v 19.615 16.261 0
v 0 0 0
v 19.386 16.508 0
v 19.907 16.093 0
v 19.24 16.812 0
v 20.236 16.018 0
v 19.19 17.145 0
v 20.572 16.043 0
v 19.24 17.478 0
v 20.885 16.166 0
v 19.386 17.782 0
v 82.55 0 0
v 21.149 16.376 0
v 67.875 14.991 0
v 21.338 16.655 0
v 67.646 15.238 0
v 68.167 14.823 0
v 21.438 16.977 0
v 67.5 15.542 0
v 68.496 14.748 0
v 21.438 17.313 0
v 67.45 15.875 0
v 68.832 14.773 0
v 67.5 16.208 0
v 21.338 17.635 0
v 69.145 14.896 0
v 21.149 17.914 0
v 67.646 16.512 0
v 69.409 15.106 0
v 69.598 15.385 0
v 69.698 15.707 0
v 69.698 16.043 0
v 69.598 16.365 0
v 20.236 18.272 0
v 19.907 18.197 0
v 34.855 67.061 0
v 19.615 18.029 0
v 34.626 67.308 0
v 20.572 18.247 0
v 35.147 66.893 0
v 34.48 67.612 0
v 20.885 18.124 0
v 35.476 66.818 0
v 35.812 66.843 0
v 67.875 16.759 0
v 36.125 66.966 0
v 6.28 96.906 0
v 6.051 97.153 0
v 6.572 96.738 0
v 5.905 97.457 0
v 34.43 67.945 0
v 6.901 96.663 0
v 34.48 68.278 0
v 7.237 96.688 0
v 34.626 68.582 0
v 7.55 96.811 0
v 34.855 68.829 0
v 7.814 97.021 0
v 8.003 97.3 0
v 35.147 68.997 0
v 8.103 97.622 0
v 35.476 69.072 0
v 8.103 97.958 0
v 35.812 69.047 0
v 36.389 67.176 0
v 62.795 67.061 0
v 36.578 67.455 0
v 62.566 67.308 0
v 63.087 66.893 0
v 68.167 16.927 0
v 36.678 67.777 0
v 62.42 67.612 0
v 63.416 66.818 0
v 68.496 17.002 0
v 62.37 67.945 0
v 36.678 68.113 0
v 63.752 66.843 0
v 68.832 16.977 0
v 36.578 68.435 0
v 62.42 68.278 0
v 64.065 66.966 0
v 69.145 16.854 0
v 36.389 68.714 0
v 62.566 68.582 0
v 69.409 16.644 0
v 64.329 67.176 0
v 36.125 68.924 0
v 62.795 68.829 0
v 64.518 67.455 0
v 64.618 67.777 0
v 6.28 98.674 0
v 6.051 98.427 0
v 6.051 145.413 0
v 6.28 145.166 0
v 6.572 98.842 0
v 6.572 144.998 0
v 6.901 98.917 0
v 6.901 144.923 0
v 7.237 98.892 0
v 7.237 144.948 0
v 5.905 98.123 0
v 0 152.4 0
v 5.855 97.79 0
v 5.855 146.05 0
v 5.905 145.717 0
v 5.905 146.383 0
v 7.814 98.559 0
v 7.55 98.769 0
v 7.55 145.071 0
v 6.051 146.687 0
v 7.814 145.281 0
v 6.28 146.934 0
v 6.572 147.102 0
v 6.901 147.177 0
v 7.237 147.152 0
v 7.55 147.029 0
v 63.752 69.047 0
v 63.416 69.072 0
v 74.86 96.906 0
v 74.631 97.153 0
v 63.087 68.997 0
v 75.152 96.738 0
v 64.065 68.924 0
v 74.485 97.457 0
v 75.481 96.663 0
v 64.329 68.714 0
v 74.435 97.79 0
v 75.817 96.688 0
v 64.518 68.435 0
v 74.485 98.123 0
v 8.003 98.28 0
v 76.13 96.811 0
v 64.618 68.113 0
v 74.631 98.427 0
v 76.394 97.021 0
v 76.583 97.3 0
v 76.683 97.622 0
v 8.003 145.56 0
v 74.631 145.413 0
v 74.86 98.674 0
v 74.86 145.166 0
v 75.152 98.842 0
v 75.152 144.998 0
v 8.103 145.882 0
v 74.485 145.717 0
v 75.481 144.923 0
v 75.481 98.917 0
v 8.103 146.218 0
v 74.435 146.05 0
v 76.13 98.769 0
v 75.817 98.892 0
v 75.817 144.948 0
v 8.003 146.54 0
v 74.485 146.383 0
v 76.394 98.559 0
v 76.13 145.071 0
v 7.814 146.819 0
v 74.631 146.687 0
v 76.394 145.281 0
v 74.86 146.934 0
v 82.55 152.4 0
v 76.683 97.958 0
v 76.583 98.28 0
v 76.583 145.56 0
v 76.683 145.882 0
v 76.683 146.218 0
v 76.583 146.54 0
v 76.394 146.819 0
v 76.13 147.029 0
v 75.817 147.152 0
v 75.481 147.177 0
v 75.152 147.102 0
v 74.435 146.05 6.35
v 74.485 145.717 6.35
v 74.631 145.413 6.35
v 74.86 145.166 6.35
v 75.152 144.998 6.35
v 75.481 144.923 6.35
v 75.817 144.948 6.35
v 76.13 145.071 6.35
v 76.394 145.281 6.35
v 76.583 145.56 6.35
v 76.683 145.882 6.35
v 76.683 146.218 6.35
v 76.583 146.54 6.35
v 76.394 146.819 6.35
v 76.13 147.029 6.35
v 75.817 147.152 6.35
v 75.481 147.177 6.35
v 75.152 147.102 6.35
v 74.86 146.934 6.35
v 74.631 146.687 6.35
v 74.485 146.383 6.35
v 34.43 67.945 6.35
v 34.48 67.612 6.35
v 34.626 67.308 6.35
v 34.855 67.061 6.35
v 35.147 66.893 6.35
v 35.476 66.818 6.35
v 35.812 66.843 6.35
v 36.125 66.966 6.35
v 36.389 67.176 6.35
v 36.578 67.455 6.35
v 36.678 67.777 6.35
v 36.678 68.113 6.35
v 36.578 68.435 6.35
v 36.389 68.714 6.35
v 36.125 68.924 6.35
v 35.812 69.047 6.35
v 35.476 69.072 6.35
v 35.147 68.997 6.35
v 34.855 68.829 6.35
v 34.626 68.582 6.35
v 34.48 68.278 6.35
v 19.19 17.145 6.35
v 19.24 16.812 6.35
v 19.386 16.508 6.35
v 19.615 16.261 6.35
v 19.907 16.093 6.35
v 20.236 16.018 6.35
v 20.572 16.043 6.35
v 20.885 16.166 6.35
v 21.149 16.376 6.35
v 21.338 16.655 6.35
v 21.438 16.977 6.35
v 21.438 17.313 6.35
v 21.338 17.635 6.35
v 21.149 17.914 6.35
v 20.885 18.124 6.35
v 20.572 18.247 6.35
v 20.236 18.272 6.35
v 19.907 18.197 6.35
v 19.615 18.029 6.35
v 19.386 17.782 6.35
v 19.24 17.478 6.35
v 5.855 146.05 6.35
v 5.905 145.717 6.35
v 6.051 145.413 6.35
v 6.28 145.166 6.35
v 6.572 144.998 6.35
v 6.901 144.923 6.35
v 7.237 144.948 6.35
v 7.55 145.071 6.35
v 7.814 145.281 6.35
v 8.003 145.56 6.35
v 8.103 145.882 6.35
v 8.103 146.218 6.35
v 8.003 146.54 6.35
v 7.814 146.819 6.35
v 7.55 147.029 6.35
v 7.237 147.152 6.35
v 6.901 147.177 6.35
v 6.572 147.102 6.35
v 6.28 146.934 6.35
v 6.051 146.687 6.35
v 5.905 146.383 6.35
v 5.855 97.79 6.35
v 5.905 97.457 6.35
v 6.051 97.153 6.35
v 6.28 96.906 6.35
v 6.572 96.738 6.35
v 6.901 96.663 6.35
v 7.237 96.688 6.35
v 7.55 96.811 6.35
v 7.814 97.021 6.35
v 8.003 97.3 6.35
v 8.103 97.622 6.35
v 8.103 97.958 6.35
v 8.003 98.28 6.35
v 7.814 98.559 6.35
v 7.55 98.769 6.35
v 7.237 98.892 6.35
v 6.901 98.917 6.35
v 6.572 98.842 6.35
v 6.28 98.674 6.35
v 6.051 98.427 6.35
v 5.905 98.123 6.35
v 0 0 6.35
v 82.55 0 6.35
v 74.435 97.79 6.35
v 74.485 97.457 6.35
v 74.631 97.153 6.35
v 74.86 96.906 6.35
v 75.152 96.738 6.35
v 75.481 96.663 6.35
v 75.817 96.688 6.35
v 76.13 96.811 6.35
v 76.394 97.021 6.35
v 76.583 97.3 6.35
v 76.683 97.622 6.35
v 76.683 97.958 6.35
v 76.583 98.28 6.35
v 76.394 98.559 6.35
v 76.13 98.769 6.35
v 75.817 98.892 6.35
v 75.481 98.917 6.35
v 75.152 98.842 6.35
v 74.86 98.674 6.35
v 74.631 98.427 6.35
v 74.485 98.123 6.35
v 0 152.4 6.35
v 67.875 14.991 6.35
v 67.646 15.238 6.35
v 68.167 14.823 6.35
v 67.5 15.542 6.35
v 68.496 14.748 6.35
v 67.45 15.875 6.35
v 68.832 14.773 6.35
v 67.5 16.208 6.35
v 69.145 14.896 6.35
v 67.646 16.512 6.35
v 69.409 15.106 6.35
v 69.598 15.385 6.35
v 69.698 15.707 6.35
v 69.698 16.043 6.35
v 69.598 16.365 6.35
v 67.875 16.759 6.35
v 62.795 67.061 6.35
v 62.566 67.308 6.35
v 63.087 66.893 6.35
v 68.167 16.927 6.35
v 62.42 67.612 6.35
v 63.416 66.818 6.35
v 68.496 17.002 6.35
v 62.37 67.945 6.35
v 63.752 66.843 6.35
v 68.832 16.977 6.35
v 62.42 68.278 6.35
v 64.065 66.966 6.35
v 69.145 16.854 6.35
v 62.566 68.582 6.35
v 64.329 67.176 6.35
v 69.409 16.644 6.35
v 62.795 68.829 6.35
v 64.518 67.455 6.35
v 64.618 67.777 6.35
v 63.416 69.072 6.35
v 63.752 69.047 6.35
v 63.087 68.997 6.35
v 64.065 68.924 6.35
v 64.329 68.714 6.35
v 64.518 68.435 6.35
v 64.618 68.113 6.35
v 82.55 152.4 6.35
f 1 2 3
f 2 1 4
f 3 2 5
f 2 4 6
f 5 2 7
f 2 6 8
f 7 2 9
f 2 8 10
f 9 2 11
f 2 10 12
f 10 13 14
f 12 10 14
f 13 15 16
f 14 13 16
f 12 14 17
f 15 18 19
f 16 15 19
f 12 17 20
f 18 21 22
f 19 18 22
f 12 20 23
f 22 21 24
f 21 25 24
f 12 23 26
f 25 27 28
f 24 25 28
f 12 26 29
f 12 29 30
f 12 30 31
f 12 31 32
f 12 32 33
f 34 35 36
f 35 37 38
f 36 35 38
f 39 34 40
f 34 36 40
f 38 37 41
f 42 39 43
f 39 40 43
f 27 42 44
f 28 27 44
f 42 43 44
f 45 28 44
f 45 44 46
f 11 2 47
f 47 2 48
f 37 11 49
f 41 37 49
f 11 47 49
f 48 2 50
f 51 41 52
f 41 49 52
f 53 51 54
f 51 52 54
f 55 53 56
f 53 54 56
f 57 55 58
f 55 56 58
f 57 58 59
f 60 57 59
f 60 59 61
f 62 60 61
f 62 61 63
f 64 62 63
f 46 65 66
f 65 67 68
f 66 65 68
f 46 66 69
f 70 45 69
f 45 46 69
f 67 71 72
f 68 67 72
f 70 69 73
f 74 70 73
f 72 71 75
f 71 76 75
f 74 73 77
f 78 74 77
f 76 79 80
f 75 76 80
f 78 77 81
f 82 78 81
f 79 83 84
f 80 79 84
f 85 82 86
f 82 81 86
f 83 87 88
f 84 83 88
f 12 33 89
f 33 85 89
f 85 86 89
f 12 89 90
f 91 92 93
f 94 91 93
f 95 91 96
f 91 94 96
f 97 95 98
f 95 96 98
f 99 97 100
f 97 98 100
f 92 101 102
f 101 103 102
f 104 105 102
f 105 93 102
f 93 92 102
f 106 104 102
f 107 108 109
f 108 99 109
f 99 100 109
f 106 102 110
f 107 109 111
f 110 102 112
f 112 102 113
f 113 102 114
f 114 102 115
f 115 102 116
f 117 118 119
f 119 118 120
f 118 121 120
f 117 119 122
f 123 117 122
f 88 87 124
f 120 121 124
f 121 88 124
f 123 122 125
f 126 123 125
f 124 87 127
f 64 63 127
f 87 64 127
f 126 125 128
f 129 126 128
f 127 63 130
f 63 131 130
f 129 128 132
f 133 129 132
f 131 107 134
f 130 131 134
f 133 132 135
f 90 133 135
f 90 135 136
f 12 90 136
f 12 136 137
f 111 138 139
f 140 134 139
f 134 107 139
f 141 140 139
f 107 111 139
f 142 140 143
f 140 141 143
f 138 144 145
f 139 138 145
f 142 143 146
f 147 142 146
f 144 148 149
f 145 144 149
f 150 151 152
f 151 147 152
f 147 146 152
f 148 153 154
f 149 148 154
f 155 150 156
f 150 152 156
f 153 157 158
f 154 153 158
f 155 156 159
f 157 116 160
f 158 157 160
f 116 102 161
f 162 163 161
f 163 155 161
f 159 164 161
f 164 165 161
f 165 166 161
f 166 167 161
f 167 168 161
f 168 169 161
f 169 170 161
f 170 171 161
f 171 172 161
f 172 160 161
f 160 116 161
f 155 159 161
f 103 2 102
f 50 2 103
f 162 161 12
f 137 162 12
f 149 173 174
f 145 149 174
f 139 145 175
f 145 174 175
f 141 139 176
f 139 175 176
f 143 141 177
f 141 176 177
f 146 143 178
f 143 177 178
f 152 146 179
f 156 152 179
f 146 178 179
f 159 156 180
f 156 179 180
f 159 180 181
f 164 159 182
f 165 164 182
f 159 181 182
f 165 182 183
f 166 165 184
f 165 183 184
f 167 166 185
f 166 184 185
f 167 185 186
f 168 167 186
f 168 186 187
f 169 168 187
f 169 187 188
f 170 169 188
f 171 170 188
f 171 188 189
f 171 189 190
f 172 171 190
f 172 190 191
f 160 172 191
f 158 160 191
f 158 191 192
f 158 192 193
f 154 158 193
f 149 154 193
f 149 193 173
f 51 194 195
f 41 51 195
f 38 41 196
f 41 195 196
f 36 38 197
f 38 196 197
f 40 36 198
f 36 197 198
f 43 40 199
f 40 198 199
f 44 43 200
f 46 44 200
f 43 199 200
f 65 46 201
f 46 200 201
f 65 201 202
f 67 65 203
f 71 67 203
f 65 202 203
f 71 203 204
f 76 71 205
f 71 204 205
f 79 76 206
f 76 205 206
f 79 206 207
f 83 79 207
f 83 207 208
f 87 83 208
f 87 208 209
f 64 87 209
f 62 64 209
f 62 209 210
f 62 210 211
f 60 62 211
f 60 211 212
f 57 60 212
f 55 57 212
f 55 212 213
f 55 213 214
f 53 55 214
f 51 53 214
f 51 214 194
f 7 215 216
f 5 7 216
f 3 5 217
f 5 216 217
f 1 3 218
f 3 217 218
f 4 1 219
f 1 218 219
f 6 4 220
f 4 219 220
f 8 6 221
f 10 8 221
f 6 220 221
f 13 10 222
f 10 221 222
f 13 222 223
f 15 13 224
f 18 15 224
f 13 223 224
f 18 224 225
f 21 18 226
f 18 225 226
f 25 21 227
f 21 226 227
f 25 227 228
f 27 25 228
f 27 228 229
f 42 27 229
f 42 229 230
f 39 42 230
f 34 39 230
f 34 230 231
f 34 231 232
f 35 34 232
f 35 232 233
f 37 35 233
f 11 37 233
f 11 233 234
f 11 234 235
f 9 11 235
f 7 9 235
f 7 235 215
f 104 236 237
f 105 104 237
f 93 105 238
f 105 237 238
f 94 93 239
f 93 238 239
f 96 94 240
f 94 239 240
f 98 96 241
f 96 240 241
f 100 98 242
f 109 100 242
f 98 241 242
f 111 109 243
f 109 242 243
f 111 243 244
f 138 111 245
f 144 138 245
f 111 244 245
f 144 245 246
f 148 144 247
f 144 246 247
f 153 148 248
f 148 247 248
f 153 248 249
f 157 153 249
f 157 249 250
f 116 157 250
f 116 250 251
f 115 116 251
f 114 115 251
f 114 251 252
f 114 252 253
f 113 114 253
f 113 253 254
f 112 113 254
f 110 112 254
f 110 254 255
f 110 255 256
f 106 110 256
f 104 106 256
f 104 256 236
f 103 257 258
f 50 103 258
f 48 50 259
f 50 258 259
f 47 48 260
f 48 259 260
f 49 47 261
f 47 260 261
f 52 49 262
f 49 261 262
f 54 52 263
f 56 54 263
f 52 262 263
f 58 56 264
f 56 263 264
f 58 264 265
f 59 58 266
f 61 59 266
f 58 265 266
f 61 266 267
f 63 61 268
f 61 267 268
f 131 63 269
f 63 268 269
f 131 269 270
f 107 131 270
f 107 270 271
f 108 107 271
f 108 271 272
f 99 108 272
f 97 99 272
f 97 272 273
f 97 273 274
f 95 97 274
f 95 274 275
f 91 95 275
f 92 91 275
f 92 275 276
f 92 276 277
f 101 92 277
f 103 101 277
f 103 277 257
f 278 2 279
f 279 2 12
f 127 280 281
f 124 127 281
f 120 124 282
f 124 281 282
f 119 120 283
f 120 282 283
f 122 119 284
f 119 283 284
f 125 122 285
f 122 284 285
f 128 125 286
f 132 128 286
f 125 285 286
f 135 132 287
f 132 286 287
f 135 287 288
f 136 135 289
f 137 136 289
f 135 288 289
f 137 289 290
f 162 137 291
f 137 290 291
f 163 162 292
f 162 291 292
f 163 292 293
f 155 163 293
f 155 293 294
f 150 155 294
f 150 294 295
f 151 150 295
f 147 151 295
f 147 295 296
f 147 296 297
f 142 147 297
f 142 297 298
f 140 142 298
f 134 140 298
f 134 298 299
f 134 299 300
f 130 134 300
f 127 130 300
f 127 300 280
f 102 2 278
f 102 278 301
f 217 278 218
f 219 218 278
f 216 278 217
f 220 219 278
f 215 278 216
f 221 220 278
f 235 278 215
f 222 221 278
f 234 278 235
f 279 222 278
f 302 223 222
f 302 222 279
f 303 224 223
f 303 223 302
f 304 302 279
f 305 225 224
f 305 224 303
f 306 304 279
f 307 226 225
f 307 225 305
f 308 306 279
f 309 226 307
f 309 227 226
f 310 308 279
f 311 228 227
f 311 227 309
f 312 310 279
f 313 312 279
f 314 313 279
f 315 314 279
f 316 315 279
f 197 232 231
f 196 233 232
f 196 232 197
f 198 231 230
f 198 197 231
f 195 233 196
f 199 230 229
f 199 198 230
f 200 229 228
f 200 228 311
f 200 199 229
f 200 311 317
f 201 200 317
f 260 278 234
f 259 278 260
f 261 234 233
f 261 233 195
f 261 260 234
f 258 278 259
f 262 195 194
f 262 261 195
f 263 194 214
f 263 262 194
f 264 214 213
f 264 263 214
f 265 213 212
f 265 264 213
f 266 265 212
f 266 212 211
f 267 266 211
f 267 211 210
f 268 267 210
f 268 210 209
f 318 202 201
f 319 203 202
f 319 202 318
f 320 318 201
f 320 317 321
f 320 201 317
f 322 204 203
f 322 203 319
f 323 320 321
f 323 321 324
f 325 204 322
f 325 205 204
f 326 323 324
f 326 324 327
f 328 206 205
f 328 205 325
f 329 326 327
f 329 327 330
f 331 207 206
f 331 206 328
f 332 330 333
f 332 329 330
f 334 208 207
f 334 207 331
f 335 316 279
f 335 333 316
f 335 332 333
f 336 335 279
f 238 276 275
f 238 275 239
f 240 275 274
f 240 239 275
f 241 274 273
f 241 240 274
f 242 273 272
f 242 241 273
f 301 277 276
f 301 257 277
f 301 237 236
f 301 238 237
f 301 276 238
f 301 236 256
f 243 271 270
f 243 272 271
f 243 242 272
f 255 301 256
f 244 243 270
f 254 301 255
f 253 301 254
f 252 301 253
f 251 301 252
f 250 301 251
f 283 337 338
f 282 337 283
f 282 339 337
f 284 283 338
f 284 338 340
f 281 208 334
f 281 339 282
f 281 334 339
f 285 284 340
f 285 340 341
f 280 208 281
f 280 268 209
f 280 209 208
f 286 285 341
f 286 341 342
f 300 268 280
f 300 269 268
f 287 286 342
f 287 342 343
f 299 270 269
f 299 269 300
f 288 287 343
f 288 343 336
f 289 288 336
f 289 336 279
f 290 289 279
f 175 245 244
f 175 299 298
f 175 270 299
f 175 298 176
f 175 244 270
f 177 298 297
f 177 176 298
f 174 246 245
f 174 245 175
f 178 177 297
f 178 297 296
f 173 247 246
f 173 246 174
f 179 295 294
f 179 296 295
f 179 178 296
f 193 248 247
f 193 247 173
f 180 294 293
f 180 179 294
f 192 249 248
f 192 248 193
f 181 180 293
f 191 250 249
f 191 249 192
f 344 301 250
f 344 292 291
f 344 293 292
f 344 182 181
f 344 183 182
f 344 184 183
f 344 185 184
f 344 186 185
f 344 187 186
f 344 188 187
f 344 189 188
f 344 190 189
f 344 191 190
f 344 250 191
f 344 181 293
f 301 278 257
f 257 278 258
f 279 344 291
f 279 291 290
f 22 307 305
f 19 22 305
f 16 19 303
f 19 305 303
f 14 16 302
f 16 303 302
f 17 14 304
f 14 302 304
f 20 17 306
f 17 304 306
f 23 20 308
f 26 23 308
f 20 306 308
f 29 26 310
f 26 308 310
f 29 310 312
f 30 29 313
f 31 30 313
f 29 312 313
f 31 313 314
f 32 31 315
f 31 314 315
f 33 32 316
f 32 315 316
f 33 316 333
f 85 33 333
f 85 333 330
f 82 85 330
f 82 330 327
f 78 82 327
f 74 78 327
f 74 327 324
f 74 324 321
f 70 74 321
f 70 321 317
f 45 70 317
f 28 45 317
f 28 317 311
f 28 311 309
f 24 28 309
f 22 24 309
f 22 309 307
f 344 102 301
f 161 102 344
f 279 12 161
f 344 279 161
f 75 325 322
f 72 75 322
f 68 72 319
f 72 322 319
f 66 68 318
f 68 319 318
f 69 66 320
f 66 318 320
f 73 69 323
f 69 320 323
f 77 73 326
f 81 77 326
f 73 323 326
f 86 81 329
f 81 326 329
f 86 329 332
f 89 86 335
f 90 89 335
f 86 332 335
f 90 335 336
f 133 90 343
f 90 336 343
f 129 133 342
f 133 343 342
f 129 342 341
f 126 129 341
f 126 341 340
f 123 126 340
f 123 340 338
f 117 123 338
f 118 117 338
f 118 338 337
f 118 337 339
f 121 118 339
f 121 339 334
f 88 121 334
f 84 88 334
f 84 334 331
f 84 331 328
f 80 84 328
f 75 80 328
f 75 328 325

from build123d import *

# Parameters (mm, degrees)
F0_W     = 82.55
F0_H     = 152.4
F1_DEPTH = 6.35
F3_D     = 2.2606


with BuildPart() as f1:
    # F0 (on Top) → F1 (new body)
    with BuildSketch(Plane.XY):
        with Locations((41.275, 76.2)):
            Rectangle(F0_W, F0_H)
    extrude(amount=F1_DEPTH)

    # F3 (through all)
    with Locations(Plane(origin=(0, 0, 0), x_dir=(1, 0, 0), z_dir=(0, 0, -1))):
        with Locations((6.985, -97.79), (6.985, -146.05), (75.565, -146.05), (75.565, -97.79), (35.56, -67.945), (63.5, -67.945), (20.32, -17.145), (68.58, -15.875)):
            Hole(F3_D / 2)


solid = f1.part
